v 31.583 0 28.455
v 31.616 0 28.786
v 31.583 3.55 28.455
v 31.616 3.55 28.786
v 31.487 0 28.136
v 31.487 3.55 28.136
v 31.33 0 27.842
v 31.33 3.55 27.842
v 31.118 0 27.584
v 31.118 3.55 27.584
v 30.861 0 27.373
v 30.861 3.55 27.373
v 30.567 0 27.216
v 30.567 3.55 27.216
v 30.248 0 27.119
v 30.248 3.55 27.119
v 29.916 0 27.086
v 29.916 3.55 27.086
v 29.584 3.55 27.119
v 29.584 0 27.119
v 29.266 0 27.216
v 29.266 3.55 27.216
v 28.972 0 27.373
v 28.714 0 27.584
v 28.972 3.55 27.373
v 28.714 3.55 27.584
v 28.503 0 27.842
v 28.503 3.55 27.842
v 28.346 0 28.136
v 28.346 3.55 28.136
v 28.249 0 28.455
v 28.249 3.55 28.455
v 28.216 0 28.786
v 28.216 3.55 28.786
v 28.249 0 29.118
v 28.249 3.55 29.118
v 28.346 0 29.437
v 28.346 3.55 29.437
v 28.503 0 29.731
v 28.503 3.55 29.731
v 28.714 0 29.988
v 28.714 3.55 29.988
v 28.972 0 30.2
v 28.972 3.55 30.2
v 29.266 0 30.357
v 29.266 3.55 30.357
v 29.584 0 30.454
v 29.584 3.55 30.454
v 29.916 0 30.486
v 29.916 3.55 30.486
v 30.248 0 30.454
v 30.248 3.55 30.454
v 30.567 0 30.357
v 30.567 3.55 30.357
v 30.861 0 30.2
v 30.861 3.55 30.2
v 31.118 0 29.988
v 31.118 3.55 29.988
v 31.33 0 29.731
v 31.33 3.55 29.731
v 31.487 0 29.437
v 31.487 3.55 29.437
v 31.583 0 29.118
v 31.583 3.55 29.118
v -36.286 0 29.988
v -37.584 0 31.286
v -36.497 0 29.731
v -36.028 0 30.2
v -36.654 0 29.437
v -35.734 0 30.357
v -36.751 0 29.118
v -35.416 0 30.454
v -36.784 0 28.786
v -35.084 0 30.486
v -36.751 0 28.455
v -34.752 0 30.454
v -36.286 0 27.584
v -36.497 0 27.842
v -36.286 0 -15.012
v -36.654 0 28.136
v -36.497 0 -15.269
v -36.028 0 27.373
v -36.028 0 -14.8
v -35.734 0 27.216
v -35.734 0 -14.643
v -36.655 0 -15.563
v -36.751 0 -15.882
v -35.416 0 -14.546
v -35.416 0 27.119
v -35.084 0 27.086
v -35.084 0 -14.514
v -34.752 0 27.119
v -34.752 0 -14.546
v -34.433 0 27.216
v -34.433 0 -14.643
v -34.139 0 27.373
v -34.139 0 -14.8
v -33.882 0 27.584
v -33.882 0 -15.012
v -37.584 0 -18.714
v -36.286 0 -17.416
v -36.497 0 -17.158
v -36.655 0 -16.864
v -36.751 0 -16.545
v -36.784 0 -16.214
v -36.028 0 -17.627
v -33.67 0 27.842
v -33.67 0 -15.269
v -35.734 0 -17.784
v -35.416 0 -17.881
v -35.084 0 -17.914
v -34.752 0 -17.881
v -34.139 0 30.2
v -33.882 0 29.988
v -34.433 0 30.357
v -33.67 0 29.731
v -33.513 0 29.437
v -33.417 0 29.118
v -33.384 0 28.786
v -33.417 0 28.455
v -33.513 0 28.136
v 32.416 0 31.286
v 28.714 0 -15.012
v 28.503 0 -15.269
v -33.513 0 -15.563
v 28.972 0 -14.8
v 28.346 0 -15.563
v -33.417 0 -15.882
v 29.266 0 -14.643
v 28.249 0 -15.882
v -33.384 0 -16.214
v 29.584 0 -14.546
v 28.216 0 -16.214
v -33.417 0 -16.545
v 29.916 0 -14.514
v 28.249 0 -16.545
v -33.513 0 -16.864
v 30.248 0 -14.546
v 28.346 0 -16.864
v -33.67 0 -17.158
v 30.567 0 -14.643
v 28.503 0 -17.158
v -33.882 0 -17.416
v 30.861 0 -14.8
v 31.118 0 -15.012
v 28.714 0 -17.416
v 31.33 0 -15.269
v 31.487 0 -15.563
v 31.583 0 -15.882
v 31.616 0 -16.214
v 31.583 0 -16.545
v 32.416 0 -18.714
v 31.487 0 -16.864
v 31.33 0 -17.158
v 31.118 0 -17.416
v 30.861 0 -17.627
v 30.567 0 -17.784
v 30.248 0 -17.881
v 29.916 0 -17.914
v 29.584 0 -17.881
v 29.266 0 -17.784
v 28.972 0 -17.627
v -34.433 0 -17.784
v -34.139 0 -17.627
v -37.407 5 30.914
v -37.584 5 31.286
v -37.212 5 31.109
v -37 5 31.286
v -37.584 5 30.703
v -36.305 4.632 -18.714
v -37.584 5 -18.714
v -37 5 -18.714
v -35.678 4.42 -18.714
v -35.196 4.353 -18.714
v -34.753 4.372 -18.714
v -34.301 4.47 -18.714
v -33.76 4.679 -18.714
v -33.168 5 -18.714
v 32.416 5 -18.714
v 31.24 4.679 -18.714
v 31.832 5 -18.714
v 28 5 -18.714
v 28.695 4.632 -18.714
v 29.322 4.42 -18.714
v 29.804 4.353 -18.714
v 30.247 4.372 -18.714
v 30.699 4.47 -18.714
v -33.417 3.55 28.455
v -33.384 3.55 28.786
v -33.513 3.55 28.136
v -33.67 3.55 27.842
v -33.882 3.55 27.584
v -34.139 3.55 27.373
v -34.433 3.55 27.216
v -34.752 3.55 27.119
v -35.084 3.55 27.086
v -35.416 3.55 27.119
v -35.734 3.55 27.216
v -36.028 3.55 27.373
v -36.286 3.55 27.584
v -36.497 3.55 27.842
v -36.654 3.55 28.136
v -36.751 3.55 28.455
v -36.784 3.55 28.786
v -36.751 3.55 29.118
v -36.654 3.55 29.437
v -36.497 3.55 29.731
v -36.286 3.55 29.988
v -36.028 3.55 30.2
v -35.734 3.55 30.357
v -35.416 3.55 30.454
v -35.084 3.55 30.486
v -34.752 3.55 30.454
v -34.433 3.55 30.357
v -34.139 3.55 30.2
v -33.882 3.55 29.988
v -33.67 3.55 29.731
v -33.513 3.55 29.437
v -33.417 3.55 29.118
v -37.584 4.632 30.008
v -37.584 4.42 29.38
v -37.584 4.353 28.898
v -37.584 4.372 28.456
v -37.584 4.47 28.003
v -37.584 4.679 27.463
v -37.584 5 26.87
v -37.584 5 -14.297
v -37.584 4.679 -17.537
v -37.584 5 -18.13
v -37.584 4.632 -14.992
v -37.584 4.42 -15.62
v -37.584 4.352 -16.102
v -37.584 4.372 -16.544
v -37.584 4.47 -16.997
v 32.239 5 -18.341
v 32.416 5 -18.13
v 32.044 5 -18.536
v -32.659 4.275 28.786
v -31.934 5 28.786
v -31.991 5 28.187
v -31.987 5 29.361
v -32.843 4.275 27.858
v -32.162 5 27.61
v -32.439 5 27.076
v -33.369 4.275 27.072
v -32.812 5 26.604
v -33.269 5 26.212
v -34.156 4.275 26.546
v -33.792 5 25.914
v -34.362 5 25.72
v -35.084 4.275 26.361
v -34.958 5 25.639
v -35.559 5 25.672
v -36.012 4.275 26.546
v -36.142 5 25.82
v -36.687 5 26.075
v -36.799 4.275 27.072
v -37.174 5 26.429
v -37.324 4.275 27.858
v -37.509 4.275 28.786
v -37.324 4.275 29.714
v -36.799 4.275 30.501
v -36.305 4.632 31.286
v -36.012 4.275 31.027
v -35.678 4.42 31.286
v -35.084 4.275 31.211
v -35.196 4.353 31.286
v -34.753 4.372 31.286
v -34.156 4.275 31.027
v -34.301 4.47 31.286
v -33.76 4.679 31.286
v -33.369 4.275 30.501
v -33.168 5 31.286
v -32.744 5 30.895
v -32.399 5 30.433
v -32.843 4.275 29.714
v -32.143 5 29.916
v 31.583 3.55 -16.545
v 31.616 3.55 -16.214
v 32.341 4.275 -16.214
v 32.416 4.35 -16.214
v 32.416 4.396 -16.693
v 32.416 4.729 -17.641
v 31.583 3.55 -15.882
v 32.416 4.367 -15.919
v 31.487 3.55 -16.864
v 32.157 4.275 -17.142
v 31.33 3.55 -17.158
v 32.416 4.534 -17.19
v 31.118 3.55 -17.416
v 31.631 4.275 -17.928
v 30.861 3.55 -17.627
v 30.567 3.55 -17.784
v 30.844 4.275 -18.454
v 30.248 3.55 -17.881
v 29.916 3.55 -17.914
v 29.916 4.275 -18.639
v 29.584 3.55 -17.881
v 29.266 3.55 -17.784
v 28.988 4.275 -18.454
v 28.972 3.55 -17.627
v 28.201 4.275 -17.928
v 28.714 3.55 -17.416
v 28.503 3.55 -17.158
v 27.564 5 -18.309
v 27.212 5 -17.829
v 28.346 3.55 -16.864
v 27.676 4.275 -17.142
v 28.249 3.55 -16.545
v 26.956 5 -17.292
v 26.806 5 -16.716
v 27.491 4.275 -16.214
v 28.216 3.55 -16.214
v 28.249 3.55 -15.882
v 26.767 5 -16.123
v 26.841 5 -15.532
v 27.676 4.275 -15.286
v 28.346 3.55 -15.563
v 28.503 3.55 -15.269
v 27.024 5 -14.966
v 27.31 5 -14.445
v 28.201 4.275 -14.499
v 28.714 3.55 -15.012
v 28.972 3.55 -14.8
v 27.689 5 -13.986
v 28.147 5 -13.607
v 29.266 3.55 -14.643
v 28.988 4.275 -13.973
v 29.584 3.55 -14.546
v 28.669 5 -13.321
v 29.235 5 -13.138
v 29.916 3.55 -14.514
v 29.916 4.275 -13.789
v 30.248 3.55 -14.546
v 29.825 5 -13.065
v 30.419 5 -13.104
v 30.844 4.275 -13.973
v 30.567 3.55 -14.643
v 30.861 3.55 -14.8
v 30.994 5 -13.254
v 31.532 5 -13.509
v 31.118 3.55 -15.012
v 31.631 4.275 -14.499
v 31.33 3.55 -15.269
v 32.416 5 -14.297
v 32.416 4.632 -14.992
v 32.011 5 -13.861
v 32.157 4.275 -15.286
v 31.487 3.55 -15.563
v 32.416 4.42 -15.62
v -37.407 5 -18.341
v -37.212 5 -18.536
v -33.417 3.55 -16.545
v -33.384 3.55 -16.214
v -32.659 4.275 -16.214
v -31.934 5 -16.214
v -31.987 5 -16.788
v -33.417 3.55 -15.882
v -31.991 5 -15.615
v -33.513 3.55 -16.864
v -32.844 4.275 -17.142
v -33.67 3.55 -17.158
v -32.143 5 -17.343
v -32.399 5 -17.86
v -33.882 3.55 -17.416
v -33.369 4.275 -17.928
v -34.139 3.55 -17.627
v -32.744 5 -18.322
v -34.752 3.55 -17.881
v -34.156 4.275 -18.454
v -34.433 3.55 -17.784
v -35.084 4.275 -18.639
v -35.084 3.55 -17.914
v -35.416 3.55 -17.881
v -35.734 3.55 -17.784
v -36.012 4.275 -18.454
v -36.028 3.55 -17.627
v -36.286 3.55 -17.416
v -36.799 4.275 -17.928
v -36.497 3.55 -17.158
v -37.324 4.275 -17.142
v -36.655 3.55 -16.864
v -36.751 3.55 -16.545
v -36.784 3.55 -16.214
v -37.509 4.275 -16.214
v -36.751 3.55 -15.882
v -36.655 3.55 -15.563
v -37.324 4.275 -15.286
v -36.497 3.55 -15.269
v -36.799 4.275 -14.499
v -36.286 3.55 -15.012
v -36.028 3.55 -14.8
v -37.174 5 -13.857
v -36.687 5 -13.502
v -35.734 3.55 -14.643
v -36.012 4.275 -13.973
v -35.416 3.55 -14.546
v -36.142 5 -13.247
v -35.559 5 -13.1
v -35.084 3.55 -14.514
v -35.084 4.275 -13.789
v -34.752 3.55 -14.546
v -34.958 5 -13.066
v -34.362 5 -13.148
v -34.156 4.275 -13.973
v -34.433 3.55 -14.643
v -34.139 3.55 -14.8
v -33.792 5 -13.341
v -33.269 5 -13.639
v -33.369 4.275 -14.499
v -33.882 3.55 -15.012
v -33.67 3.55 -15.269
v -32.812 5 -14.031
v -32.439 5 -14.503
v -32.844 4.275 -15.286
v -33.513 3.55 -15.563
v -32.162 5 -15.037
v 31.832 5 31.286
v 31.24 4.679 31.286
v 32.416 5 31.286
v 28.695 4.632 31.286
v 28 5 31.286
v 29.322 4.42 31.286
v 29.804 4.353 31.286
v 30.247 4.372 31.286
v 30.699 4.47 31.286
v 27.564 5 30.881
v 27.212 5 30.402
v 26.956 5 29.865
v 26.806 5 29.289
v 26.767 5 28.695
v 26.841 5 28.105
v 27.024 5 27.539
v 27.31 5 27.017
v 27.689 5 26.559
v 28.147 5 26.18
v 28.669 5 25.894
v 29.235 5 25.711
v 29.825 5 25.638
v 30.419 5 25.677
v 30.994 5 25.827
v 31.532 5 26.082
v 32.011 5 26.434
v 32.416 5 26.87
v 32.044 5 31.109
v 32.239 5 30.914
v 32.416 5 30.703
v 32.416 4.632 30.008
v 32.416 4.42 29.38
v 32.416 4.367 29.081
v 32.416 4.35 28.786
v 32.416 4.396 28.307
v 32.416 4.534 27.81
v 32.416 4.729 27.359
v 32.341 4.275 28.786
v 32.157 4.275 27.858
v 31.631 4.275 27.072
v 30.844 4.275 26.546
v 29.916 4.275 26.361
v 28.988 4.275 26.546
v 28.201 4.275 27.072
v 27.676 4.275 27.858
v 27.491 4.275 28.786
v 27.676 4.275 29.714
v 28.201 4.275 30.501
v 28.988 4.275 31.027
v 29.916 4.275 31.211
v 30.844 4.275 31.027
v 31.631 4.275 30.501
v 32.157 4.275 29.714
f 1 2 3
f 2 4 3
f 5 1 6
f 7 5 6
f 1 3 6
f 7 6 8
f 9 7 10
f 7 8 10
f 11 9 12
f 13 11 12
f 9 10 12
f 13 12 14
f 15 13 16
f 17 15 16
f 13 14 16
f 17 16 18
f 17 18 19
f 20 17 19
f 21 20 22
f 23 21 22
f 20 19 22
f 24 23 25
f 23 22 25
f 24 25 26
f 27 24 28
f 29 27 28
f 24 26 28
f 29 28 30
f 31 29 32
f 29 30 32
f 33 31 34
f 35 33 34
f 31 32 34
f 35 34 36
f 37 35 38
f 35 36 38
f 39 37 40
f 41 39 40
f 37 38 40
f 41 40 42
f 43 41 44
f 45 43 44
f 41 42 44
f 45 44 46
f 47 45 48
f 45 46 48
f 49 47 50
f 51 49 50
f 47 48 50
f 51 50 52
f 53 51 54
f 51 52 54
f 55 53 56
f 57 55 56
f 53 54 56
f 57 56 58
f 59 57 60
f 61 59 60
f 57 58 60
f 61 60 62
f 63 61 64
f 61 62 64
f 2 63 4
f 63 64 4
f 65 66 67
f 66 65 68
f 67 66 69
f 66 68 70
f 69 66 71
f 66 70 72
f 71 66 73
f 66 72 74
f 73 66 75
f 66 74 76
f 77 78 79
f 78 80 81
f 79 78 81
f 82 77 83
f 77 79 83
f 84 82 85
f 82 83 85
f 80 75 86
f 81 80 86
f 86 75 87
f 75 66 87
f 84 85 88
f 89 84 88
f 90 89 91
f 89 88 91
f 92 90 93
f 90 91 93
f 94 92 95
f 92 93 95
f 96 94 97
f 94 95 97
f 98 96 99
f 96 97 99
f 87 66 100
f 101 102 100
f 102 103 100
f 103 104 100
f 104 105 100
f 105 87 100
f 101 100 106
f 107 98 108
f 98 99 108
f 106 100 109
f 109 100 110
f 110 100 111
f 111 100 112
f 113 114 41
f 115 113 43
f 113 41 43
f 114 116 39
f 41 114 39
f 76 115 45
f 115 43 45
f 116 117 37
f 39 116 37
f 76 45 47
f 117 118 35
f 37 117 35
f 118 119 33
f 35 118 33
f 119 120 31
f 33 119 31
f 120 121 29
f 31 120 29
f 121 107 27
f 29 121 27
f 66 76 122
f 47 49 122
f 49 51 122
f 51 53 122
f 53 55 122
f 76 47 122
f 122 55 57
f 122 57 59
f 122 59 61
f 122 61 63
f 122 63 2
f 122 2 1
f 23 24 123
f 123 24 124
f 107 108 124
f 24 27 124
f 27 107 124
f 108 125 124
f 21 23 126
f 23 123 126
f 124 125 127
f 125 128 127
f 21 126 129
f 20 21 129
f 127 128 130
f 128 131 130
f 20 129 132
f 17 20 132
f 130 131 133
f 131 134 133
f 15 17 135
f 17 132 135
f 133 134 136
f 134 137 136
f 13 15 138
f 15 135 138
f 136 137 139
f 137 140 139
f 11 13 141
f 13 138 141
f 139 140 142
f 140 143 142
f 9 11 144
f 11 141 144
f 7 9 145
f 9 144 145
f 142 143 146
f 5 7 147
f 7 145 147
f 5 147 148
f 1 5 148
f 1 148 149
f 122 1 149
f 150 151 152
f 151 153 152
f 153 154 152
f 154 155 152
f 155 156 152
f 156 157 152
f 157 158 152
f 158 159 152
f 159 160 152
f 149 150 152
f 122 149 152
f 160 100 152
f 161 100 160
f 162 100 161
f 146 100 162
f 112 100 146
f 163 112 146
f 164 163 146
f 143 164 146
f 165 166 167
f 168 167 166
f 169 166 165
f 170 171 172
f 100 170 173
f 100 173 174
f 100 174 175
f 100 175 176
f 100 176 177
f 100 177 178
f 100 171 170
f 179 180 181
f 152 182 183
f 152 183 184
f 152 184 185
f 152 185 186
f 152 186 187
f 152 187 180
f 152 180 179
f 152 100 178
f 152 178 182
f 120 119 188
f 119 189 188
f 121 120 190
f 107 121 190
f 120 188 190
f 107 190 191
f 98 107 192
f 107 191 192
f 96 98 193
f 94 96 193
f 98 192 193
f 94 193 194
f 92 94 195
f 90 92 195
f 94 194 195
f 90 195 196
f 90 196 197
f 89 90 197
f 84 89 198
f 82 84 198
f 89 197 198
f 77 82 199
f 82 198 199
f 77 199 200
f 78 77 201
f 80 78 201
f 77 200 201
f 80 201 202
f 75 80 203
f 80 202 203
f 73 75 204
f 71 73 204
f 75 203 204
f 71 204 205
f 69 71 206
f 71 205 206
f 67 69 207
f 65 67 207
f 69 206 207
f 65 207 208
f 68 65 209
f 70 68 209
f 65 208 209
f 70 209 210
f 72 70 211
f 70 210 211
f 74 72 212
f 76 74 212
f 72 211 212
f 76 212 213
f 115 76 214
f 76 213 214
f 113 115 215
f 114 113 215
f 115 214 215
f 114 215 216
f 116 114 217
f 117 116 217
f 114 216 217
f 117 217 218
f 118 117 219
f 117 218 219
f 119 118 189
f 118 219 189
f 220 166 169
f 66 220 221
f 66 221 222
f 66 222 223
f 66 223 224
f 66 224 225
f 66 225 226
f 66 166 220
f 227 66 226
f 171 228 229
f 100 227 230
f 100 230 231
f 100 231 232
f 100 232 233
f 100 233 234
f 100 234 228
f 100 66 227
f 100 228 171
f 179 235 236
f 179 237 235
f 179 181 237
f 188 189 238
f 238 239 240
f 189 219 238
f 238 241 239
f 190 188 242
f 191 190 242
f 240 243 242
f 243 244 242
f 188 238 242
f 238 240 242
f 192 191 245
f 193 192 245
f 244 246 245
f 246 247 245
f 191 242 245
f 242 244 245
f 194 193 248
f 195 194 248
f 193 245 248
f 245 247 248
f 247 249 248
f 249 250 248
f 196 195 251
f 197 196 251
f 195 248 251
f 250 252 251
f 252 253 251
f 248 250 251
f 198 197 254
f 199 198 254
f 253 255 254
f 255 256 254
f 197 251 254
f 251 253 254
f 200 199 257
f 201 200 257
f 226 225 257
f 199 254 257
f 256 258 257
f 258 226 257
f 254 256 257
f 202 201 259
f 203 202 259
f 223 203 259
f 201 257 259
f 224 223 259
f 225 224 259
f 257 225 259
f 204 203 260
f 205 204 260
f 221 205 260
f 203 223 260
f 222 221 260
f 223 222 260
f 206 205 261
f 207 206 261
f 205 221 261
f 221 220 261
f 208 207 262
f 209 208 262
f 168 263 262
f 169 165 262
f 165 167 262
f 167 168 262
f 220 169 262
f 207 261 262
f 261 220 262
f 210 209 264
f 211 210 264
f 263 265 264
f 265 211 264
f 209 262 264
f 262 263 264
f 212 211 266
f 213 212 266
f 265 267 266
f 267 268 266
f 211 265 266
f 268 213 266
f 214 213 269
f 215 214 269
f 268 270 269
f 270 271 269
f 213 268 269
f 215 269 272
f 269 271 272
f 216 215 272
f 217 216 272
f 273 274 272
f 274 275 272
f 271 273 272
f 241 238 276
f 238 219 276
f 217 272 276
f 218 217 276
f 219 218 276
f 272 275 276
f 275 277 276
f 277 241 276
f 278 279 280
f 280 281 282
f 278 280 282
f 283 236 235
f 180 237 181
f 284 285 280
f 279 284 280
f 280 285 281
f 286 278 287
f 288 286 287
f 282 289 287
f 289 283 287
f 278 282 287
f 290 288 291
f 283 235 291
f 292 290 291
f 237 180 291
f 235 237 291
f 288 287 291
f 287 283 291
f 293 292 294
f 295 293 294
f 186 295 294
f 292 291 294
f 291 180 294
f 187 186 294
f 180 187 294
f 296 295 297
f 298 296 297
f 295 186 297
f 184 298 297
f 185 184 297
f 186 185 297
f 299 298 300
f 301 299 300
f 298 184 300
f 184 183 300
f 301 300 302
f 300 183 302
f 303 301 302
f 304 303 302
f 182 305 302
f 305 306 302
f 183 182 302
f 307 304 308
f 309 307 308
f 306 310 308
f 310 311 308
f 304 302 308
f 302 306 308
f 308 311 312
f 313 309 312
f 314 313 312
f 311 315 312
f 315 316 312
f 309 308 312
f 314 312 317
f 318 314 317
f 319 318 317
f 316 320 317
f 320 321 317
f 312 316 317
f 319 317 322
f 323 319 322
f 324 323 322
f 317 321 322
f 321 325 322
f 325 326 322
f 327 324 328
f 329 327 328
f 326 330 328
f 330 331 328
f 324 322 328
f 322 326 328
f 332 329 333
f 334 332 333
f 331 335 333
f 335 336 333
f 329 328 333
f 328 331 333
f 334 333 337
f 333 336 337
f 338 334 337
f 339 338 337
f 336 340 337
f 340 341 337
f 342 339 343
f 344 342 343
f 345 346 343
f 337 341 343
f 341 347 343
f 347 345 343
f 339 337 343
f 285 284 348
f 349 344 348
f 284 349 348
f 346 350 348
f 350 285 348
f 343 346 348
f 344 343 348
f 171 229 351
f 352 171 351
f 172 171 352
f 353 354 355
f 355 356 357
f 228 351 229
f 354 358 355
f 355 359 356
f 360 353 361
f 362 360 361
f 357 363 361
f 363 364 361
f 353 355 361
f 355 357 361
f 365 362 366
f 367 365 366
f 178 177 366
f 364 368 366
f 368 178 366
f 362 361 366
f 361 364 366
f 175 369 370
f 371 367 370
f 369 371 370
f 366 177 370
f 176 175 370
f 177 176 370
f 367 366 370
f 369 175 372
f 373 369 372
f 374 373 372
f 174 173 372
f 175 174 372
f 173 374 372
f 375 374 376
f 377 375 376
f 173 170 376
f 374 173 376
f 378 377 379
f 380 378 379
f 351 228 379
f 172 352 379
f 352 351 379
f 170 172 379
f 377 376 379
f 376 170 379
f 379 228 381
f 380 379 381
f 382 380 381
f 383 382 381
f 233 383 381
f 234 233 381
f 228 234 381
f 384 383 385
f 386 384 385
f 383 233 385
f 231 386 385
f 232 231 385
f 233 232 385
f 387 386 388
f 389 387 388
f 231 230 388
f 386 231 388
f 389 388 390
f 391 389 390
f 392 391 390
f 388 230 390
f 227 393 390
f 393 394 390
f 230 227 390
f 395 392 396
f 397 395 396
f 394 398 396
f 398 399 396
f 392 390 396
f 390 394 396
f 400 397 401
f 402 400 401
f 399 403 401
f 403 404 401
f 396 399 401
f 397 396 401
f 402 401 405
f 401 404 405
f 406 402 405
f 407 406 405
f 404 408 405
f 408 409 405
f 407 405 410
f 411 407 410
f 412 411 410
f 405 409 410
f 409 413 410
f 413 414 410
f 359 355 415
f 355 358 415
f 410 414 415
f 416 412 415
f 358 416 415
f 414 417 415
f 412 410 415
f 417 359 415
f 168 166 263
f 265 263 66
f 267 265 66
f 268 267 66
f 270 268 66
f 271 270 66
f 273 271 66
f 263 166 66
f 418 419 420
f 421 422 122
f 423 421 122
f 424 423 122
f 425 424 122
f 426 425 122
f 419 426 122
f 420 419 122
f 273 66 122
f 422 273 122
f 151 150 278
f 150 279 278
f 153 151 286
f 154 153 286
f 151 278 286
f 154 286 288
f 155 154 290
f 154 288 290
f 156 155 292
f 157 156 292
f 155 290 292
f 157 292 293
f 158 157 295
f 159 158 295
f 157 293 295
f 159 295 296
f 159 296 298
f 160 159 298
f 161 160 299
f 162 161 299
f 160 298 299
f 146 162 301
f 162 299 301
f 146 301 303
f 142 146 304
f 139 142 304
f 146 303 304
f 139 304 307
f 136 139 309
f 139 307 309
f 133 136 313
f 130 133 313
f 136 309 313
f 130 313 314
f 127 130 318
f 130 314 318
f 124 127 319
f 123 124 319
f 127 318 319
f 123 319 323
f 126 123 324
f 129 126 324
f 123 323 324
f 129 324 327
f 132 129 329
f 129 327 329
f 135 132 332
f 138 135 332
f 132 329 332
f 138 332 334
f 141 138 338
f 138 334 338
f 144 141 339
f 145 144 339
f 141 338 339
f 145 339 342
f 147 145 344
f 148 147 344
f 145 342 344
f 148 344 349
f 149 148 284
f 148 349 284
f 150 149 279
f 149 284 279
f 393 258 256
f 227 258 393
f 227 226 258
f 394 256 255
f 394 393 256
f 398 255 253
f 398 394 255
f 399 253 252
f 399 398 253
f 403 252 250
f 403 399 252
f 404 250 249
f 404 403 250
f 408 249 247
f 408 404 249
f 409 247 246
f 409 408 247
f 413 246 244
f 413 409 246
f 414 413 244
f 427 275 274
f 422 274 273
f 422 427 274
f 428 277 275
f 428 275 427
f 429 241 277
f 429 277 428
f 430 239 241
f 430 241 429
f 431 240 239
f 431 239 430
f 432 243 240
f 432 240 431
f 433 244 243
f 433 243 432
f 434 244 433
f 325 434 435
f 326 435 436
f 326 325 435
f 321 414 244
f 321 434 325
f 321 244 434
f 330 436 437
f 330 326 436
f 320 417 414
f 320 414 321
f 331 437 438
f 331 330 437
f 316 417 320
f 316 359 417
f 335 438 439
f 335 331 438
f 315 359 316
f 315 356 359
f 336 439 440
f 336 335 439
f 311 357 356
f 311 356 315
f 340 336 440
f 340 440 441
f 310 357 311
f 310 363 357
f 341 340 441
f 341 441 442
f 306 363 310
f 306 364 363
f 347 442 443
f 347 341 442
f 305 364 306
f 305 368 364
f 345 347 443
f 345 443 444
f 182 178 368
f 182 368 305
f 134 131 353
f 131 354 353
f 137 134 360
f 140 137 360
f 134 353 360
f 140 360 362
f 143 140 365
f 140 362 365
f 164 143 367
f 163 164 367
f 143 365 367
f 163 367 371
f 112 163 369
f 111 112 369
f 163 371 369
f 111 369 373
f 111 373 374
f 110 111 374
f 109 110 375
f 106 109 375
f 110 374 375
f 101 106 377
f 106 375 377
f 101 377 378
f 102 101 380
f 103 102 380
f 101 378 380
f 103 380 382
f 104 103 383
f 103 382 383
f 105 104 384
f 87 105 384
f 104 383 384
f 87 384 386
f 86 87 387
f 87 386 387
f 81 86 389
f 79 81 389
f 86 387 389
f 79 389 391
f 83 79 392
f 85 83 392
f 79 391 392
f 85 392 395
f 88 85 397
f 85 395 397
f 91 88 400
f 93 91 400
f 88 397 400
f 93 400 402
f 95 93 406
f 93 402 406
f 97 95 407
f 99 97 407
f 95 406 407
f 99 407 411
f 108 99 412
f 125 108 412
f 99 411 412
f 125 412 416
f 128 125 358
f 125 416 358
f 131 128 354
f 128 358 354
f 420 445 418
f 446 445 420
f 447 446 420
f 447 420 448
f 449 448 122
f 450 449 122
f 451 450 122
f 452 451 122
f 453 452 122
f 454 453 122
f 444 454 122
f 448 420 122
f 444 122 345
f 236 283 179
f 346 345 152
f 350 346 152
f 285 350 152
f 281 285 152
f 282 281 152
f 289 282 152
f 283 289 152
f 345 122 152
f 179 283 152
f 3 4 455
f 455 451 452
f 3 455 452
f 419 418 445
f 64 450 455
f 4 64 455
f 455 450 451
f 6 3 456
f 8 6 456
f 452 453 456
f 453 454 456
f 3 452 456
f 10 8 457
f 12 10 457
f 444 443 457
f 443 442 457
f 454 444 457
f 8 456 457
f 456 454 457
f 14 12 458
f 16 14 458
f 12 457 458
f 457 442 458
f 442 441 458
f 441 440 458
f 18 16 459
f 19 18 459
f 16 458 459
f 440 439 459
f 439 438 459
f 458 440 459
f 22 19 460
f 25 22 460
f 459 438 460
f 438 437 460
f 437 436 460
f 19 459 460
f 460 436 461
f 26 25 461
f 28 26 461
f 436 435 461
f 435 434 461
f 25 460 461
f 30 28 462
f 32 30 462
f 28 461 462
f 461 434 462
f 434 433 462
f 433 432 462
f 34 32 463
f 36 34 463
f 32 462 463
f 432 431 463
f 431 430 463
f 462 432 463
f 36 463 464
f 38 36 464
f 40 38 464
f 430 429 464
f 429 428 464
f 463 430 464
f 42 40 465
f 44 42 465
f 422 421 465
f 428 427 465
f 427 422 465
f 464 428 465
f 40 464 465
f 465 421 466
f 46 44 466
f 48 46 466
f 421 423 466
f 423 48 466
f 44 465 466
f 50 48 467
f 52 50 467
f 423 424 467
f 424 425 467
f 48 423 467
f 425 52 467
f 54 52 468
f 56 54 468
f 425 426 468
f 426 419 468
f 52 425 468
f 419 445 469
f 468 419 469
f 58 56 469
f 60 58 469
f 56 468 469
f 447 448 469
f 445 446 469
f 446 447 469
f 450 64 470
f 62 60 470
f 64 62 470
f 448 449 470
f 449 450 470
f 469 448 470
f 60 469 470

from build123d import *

# Parameters (mm, degrees)
CROQUIS1_W              = 70
CROQUIS1_H              = 50
SALIENTE_EXTRUIR1_DEPTH = 5


# Read off the part's stored shape, not the designer's step: Avellanado para tornillo con cabeza plana avellanada de M31
with BuildPart() as part:
    # Croquis1 → Saliente-Extruir1 (new body)
    with BuildSketch(Plane(origin=(0, 0, 0), x_dir=(1, 0, 0), z_dir=(0, 1, 0))):
        with Locations((-2.583892617, -6.286353468)):
            Rectangle(CROQUIS1_W, CROQUIS1_H)
    extrude(amount=SALIENTE_EXTRUIR1_DEPTH)

    # Avellanado para tornillo con cabeza  2 → Avellanado para tornillo con cabeza plana avellanada de M31 (revolve, cut)
    with BuildSketch(Plane(origin=(-35.083881152, 0, 28.786353921), x_dir=(1, 0, 0), z_dir=(0, 0, 1))):
        Polygon((3.15, 5), (0, 5), (0, 0), (1.7, 0), (1.7, 3.55), align=None)
    revolve(axis=Axis((-35.083881152, 0, 28.786353921), (0, 1, 0)), mode=Mode.SUBTRACT)

    # Avellanado para tornillo con cabeza 3 ou → Avellanado para tornillo con cabeza  3 (revolve, cut)
    with BuildSketch(Plane(origin=(29.916117476, 0, 28.786354313), x_dir=(1, 0, 0), z_dir=(0, 0, 1))):
        Polygon((3.15, 5), (0, 5), (0, 0), (1.7, 0), (1.7, 3.55), align=None)
    revolve(axis=Axis((29.916117476, 0, 28.786354313), (0, 1, 0)), mode=Mode.SUBTRACT)

    # Avellanado para tornillo con cabeza 4 ou → Avellanado para tornillo con cabeza  4 (revolve, cut)
    with BuildSketch(Plane(origin=(29.916118299, 0, -16.213646367), x_dir=(1, 0, 0), z_dir=(0, 0, 1))):
        Polygon((3.15, 5), (0, 5), (0, 0), (1.7, 0), (1.7, 3.55), align=None)
    revolve(axis=Axis((29.916118299, 0, -16.213646367), (0, 1, 0)), mode=Mode.SUBTRACT)

    # Avellanado para tornillo con cabeza 5 ou → Avellanado para tornillo con cabeza  5 (revolve, cut)
    with BuildSketch(Plane(origin=(-35.083915903, 0, -16.21364324), x_dir=(1, 0, 0), z_dir=(0, 0, 1))):
        Polygon((3.15, 5), (0, 5), (0, 0), (1.7, 0), (1.7, 3.55), align=None)
    revolve(axis=Axis((-35.083915903, 0, -16.21364324), (0, 1, 0)), mode=Mode.SUBTRACT)


solid = part.part
